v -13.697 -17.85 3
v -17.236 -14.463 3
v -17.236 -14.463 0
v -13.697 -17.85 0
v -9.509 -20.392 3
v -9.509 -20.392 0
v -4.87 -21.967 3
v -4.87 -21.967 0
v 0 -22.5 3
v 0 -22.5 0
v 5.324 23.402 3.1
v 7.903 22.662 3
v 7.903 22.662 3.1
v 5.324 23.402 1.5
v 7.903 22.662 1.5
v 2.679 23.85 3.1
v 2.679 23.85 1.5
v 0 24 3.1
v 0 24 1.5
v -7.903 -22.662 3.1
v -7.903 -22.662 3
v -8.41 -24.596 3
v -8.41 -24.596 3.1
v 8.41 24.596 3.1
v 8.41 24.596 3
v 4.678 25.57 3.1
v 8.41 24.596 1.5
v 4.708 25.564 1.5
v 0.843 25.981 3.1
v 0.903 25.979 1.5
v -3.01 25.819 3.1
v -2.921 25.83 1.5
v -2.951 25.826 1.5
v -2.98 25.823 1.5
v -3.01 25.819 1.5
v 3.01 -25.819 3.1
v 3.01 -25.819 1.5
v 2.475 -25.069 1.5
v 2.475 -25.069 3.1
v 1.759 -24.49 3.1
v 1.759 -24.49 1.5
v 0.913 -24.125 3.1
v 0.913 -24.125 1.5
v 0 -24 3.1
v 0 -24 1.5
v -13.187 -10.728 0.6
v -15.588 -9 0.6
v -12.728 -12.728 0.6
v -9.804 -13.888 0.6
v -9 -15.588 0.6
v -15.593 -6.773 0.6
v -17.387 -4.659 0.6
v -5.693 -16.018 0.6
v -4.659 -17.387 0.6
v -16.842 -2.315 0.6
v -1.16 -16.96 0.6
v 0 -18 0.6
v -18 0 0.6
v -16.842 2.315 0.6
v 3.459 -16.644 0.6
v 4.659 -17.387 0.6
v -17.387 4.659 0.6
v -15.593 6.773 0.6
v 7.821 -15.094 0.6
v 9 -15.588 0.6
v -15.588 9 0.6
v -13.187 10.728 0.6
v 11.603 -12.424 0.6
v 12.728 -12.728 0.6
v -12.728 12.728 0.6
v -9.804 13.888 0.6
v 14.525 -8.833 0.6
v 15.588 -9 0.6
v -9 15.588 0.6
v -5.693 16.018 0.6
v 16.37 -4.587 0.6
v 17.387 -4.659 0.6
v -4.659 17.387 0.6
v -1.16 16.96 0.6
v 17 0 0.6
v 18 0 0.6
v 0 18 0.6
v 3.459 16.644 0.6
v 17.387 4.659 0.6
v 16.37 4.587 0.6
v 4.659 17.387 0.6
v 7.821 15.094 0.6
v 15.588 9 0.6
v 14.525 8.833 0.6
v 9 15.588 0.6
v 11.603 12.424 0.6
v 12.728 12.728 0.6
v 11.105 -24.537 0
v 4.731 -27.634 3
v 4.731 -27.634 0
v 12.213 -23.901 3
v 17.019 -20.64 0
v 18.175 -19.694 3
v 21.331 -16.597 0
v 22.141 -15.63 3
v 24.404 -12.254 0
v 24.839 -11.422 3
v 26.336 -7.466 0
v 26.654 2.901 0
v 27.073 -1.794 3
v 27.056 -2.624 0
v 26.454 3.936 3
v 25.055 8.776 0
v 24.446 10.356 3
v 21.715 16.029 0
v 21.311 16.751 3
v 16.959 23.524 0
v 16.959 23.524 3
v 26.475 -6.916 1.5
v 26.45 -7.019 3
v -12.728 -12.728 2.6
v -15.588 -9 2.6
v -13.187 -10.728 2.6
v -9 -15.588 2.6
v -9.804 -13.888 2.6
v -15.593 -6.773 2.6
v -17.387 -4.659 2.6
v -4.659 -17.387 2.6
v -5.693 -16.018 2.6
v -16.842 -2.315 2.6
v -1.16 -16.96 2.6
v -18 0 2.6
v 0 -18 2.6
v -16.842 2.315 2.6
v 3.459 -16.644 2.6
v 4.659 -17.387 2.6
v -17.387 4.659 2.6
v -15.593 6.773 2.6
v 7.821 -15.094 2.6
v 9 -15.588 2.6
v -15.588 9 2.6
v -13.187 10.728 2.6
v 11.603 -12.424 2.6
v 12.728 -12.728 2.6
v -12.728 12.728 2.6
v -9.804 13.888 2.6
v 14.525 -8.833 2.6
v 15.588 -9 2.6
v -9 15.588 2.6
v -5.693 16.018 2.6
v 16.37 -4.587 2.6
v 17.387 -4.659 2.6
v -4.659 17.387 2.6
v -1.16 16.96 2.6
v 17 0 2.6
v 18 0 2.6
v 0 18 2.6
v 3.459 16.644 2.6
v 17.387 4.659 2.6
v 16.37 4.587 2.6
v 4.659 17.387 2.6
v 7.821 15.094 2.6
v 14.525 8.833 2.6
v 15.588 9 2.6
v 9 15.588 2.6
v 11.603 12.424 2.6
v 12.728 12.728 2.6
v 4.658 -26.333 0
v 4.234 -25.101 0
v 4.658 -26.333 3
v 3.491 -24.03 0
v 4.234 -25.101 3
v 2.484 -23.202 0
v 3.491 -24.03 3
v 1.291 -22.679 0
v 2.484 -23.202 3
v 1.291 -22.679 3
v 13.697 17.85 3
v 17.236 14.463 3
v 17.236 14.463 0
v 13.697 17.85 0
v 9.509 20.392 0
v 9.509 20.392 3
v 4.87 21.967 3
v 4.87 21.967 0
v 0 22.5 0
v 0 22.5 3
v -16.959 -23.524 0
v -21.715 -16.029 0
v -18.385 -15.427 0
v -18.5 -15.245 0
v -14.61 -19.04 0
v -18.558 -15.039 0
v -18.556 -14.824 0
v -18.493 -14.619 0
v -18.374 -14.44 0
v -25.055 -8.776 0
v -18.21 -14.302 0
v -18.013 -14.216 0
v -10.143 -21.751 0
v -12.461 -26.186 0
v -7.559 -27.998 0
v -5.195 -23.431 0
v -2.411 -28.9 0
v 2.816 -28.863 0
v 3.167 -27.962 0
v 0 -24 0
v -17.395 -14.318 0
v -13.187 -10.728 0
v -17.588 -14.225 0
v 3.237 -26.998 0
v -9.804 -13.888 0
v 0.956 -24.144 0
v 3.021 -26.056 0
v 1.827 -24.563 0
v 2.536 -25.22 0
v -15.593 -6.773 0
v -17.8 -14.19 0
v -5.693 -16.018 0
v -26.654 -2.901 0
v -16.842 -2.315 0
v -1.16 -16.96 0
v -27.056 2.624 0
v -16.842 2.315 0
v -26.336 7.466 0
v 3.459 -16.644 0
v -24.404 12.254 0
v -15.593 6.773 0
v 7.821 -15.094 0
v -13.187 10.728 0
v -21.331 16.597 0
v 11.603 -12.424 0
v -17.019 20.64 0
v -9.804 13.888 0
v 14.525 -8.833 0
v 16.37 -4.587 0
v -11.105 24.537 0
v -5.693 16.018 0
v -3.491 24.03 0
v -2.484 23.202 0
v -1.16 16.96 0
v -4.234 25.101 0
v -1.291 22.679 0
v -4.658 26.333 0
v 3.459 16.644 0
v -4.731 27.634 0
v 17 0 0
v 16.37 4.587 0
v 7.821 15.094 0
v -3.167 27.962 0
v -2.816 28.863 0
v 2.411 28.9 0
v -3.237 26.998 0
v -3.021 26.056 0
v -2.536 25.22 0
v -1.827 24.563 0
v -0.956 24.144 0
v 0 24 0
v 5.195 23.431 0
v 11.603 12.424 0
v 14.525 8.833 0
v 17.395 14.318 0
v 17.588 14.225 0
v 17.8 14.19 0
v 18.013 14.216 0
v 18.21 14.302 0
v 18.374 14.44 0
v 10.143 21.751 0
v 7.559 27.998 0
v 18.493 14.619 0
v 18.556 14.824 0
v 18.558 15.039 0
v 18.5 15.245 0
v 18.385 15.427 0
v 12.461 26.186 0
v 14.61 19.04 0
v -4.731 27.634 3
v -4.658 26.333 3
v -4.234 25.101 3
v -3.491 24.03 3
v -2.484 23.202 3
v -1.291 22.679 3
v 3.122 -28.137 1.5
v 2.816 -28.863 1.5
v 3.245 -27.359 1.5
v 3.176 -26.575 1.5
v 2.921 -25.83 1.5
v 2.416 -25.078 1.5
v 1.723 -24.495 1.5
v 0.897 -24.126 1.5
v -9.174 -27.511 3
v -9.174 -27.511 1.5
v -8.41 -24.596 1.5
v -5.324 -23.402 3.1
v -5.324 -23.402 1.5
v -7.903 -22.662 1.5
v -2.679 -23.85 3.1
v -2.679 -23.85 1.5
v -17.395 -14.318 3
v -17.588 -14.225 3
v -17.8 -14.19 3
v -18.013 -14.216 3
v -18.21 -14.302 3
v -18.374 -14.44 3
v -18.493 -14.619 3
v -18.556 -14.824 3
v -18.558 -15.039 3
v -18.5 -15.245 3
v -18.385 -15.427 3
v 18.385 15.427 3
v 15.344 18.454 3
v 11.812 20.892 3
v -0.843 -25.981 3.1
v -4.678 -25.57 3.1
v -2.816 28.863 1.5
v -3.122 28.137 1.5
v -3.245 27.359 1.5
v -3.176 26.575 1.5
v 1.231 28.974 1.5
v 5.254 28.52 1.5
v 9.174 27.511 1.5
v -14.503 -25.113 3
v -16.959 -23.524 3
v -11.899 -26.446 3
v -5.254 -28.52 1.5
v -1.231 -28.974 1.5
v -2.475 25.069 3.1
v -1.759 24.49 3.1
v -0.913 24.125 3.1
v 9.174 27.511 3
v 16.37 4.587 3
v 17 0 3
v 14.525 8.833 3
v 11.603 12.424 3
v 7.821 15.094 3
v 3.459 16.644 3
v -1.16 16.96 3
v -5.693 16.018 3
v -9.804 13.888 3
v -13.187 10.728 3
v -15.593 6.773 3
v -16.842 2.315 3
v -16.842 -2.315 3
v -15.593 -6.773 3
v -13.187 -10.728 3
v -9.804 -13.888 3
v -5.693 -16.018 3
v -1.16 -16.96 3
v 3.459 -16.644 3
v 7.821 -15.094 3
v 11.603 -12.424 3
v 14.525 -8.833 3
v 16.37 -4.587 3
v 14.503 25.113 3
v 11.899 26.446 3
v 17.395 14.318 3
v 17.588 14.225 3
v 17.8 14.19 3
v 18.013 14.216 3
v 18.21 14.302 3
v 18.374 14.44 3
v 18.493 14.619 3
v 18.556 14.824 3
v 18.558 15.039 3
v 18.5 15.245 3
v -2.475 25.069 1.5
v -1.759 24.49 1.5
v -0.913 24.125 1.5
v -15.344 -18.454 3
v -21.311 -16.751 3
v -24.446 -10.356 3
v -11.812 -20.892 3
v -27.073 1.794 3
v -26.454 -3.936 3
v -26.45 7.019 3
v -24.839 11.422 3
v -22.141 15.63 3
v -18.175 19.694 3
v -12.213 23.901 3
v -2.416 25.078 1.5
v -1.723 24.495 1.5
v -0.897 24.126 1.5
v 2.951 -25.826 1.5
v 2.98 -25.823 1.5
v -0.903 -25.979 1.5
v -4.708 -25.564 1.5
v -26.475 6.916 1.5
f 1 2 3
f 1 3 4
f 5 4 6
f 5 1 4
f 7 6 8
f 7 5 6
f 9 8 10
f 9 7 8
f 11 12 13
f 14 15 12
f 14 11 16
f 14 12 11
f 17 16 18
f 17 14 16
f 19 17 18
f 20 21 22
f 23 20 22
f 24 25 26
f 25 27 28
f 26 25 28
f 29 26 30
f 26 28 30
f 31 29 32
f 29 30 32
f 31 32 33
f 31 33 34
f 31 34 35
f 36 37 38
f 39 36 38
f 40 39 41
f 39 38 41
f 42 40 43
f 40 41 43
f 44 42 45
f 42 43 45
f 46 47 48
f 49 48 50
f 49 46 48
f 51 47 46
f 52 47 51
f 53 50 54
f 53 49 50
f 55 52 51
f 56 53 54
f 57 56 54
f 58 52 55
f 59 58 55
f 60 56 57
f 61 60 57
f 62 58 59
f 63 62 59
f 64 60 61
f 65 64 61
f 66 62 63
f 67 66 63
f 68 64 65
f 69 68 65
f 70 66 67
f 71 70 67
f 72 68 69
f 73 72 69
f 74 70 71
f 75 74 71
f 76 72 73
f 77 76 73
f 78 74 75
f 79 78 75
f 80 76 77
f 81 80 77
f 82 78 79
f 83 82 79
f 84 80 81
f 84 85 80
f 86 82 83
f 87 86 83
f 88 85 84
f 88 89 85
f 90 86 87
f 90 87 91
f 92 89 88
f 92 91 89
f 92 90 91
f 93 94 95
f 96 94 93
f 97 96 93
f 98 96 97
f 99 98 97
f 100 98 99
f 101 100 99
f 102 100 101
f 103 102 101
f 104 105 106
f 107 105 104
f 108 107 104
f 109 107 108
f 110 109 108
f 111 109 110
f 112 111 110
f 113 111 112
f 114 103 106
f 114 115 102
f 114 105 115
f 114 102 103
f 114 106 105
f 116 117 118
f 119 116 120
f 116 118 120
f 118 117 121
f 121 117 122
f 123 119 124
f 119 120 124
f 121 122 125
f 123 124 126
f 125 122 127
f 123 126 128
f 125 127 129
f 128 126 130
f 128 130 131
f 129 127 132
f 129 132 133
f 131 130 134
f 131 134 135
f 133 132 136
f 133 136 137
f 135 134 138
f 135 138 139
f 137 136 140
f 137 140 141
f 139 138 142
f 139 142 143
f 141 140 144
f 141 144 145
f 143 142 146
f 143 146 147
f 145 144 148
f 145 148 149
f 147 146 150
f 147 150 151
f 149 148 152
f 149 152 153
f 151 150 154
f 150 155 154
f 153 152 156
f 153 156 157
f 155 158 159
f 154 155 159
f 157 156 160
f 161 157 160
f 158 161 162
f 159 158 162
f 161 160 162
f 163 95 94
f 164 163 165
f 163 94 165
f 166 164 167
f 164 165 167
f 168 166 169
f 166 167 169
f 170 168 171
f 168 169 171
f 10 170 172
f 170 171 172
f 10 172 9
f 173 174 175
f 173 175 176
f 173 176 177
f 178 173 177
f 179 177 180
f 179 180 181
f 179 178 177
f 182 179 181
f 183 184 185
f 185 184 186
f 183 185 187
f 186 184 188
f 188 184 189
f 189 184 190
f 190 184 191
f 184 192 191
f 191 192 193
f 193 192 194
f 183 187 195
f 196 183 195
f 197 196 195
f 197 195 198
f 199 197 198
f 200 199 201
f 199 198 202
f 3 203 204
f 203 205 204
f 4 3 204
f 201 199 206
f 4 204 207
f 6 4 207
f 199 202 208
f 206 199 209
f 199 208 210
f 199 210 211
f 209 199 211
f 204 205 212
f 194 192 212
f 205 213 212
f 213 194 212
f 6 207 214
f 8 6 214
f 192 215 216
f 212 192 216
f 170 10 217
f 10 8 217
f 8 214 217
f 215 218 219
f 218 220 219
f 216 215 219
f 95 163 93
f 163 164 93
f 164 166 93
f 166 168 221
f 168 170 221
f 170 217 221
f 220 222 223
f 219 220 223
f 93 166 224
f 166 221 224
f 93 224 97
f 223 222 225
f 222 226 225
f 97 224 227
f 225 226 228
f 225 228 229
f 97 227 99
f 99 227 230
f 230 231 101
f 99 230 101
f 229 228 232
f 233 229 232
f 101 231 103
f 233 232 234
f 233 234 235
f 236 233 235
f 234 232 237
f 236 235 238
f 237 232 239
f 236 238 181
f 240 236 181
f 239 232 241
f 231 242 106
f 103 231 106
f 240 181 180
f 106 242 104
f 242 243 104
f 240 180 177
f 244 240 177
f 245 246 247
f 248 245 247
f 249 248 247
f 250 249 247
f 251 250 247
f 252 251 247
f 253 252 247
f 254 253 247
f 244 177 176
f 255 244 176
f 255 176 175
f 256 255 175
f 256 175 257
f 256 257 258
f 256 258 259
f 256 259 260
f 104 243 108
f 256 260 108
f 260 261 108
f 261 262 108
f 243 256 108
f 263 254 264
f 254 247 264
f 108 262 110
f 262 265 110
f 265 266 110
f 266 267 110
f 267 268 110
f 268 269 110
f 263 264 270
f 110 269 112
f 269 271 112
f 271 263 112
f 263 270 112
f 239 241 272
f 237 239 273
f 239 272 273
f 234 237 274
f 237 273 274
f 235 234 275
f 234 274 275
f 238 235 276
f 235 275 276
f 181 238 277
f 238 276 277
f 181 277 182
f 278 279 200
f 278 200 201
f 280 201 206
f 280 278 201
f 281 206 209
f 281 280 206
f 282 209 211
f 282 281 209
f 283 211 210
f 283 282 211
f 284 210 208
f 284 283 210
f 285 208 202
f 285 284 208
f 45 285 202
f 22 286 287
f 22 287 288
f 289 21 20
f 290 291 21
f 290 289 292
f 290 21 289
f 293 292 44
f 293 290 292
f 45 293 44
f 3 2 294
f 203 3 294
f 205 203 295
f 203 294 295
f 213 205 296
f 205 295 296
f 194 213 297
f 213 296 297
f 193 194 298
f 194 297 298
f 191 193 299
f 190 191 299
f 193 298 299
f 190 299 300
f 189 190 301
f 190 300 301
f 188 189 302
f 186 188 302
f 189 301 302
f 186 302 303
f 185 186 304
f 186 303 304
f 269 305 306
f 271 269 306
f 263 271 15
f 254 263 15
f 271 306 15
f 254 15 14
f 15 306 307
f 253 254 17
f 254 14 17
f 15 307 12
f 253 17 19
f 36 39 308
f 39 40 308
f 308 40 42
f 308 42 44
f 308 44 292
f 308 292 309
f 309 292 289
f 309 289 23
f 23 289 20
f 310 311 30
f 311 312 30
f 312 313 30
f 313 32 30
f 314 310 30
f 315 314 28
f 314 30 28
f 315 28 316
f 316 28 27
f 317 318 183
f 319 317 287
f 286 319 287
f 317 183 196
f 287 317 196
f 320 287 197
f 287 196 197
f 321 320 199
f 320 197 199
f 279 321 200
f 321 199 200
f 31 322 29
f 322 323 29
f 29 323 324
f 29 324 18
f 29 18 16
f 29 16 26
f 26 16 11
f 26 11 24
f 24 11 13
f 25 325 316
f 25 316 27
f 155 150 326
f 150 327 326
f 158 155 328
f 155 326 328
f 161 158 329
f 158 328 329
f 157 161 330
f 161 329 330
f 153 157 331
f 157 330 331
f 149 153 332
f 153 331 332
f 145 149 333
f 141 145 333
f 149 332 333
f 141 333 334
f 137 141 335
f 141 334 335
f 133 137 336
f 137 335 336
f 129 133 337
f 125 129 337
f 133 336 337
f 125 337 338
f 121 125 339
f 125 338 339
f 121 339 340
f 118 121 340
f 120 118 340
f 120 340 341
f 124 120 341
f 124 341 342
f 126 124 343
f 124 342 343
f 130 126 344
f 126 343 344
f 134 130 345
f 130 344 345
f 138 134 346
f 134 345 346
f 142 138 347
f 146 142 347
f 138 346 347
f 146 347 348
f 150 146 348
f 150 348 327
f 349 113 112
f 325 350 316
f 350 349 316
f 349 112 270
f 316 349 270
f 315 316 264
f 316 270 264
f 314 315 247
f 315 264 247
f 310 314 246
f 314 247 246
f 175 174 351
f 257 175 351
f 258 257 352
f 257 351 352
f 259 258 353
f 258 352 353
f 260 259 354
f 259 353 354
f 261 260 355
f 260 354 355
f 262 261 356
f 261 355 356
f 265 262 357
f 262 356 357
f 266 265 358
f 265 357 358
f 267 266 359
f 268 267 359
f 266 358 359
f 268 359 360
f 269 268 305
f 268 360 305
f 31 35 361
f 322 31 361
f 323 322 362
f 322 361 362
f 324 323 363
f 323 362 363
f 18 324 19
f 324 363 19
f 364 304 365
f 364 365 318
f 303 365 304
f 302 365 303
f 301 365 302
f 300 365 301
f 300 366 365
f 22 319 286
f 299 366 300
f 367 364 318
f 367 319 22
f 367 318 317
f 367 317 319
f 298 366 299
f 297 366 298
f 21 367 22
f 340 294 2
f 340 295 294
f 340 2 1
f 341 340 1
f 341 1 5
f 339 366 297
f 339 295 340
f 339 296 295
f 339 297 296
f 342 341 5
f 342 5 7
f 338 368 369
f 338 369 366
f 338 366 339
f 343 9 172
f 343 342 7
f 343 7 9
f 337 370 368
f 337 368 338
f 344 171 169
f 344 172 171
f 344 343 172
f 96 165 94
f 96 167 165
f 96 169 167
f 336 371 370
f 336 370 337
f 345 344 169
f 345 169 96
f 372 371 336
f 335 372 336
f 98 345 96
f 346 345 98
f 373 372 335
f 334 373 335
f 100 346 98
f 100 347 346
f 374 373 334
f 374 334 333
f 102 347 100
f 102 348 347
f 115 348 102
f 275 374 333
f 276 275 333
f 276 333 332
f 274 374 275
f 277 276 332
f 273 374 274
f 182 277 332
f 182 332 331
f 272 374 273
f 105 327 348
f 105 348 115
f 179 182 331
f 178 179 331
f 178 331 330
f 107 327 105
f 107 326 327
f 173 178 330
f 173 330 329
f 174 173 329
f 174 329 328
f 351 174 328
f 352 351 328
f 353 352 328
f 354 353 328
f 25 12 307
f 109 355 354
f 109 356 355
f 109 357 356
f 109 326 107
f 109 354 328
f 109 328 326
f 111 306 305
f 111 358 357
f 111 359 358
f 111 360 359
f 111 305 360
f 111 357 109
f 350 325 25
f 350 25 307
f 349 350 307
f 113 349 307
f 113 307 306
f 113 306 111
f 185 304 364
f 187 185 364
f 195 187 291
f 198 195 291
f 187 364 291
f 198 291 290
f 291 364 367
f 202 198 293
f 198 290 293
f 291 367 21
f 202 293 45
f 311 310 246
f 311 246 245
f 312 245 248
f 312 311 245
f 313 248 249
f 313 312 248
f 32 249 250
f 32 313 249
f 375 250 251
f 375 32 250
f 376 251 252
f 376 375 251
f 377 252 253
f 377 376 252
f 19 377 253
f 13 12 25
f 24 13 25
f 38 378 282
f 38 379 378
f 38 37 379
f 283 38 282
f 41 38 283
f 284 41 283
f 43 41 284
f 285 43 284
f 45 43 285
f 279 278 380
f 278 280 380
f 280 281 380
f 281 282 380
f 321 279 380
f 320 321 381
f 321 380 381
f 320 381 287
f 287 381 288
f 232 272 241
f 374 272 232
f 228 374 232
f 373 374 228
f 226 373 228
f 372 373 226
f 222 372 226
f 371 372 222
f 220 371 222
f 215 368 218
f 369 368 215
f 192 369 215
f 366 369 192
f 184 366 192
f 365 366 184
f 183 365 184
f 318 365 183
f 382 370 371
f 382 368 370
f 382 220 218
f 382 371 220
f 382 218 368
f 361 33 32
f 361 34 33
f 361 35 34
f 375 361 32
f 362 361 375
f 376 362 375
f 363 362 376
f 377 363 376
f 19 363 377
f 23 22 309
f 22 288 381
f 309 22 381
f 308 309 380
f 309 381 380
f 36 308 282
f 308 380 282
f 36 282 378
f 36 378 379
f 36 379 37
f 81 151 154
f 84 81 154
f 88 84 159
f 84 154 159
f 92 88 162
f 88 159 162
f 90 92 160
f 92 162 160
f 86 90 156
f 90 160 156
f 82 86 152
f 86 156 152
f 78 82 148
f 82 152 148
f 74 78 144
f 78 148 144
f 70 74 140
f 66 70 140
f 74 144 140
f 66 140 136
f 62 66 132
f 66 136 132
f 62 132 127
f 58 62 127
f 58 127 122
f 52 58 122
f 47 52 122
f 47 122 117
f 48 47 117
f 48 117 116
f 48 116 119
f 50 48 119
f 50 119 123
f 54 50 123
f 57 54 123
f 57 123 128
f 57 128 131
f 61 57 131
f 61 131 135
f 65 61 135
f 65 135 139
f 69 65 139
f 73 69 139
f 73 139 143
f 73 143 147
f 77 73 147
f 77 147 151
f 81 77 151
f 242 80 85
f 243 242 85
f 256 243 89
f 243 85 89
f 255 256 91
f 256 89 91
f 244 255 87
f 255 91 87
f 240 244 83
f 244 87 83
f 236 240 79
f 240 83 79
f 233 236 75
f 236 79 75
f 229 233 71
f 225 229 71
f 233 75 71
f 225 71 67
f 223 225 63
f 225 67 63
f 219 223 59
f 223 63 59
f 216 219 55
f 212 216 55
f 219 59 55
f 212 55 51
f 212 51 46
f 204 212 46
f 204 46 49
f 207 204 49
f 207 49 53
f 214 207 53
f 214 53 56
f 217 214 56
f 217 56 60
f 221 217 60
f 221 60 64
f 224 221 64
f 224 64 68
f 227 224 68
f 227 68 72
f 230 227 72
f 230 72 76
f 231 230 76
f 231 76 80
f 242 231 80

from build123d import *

# Parameters (mm, degrees)
SKETCH_R              = 29
PAD_DEPTH             = 3
POCKET_DEPTH          = 5
POLARPATTERN_COUNT    = 2
POCKET001_DEPTH       = 5
POLARPATTERN001_COUNT = 2
SKETCH003_R           = 18
POCKET002_DEPTH       = 2.4
SKETCH004_R           = 17
POCKET003_DEPTH       = 5
POCKET004_DEPTH       = 1.5
POLARPATTERN002_COUNT = 2
PAD001_DEPTH          = 1.6
POLARPATTERN003_COUNT = 2
SKETCH007_R           = 18.340375
PAD002_DEPTH          = 0.4
SKETCH008_R           = 17
POCKET005_DEPTH       = 5


with BuildPart() as part:
    # Sketch → Pad (new body)
    with BuildSketch(Plane.XY):
        Circle(SKETCH_R)
    extrude(amount=PAD_DEPTH)

    # Sketch001 (on Face3 of Pad) → Pocket (cut)
    with BuildSketch(Plane.XY.offset(3)):
        with BuildLine():
            ThreePointArc((-18.385067, -15.426903), (-10.142838, -21.751387), (0, -24))
            ThreePointArc((1.989789, -29.812024), (3.071599, -26.195037), (0, -24))
            ThreePointArc((1.989789, -29.812024), (2.178472, -31.958585), (3.600531, -30.339612))
            ThreePointArc((3.600531, -30.339612), (4.313448, -25.265566), (0, -22.5))
            ThreePointArc((-17.236, -14.462721), (-9.508911, -20.391925), (0, -22.5))
            ThreePointArc((-17.236, -14.462721), (-18.296812, -14.365288), (-18.385067, -15.426903))
        make_face()
    pocket = extrude(amount=-POCKET_DEPTH, mode=Mode.SUBTRACT)

    # PolarPattern: Pocket ×2 about axis
    polarpattern_axis = Axis((0, 0, 3), (0, 0, 1))
    for i in range(1, POLARPATTERN_COUNT):
        add(pocket.rotate(polarpattern_axis, i * 360 / POLARPATTERN_COUNT), mode=Mode.SUBTRACT)

    # Sketch002 (on Face4 of PolarPattern) → Pocket001 (cut)
    with BuildSketch(Plane.XY.offset(3)):
        with BuildLine():
            add(Edge.make_bspline(
                [(-3.074709, 28.315083), (-42.734669, 12.512014), (-16.852234, -23.673746)],
                knots=[0, 0, 0, 1, 1, 1], degree=2))
            Line((-16.852234, -23.673746), (-19.979143, -30.365301))
            Line((-19.979143, -30.365301), (-32.54401, -28.825899))
            Line((-32.54401, -28.825899), (-39.32571, 4.3753))
            Line((-39.32571, 4.3753), (-7.235262, 36.220139))
            Line((-7.235262, 36.220139), (-3.074709, 28.315083))
        make_face()
    pocket001 = extrude(amount=-POCKET001_DEPTH, mode=Mode.SUBTRACT)

    # PolarPattern001: Pocket001 ×2 about axis
    polarpattern001_axis = Axis((0, 0, 3), (0, 0, 1))
    for i in range(1, POLARPATTERN001_COUNT):
        add(pocket001.rotate(polarpattern001_axis, i * 360 / POLARPATTERN001_COUNT), mode=Mode.SUBTRACT)

    # Sketch003 (on Face4 of PolarPattern001) → Pocket002 (cut)
    with BuildSketch(Plane.XY.offset(3)):
        Circle(SKETCH003_R)
    extrude(amount=-POCKET002_DEPTH, mode=Mode.SUBTRACT)

    # Sketch004 (on Face18 of Pocket002) → Pocket003 (cut)
    with BuildSketch(Plane.XY.offset(0.6)):
        Circle(SKETCH004_R)
    extrude(amount=-POCKET003_DEPTH, mode=Mode.SUBTRACT)

    # Sketch005 (on Face4 of Pocket003) → Pocket004 (cut)
    with BuildSketch(Plane.XY.offset(3)):
        Polygon((-7.733806, -22.017185), (-1.653993, -23.383749), (2.389916, -24.108864), (3.923815, -27.065102), (3.45663, -30.749018), (-4.573239, -30.749018), (-10.02356, -30.749018), align=None)
    pocket004 = extrude(amount=-POCKET004_DEPTH, mode=Mode.SUBTRACT)

    # PolarPattern002: Pocket004 ×2 about axis
    polarpattern002_axis = Axis((0, 0, 3), (0, 0, 1))
    for i in range(1, POLARPATTERN002_COUNT):
        add(pocket004.rotate(polarpattern002_axis, i * 360 / POLARPATTERN002_COUNT), mode=Mode.SUBTRACT)

    # Sketch006 (on Face28 of PolarPattern002) → Pad001 (join)
    with BuildSketch(Plane.XY.offset(1.5)):
        with BuildLine():
            ThreePointArc((-7.90278, -22.661555), (-4.00766, -23.663023), (0, -24))
            ThreePointArc((3.010027, -25.819366), (1.758576, -24.49018), (0, -24))
            ThreePointArc((-8.410088, -24.596145), (-2.768435, -25.846386), (3.010027, -25.819366))
            Line((-7.90278, -22.661555), (-8.410088, -24.596145))
        make_face()
    pad001 = extrude(amount=PAD001_DEPTH)

    # PolarPattern003: Pad001 ×2 about axis
    polarpattern003_axis = Axis((0, 0, 1.5), (0, 0, 1))
    for i in range(1, POLARPATTERN003_COUNT):
        add(pad001.rotate(polarpattern003_axis, i * 360 / POLARPATTERN003_COUNT))

    # Sketch007 (on Face6 of PolarPattern003) → Pad002 (join)
    with BuildSketch(Plane.XY.offset(3)):
        Circle(SKETCH007_R)
    extrude(amount=-PAD002_DEPTH)

    # Sketch008 (on Face35 of Pad002) → Pocket005 (cut)
    with BuildSketch(Plane.XY.offset(3)):
        Circle(SKETCH008_R)
    extrude(amount=-POCKET005_DEPTH, mode=Mode.SUBTRACT)


solid = part.part
